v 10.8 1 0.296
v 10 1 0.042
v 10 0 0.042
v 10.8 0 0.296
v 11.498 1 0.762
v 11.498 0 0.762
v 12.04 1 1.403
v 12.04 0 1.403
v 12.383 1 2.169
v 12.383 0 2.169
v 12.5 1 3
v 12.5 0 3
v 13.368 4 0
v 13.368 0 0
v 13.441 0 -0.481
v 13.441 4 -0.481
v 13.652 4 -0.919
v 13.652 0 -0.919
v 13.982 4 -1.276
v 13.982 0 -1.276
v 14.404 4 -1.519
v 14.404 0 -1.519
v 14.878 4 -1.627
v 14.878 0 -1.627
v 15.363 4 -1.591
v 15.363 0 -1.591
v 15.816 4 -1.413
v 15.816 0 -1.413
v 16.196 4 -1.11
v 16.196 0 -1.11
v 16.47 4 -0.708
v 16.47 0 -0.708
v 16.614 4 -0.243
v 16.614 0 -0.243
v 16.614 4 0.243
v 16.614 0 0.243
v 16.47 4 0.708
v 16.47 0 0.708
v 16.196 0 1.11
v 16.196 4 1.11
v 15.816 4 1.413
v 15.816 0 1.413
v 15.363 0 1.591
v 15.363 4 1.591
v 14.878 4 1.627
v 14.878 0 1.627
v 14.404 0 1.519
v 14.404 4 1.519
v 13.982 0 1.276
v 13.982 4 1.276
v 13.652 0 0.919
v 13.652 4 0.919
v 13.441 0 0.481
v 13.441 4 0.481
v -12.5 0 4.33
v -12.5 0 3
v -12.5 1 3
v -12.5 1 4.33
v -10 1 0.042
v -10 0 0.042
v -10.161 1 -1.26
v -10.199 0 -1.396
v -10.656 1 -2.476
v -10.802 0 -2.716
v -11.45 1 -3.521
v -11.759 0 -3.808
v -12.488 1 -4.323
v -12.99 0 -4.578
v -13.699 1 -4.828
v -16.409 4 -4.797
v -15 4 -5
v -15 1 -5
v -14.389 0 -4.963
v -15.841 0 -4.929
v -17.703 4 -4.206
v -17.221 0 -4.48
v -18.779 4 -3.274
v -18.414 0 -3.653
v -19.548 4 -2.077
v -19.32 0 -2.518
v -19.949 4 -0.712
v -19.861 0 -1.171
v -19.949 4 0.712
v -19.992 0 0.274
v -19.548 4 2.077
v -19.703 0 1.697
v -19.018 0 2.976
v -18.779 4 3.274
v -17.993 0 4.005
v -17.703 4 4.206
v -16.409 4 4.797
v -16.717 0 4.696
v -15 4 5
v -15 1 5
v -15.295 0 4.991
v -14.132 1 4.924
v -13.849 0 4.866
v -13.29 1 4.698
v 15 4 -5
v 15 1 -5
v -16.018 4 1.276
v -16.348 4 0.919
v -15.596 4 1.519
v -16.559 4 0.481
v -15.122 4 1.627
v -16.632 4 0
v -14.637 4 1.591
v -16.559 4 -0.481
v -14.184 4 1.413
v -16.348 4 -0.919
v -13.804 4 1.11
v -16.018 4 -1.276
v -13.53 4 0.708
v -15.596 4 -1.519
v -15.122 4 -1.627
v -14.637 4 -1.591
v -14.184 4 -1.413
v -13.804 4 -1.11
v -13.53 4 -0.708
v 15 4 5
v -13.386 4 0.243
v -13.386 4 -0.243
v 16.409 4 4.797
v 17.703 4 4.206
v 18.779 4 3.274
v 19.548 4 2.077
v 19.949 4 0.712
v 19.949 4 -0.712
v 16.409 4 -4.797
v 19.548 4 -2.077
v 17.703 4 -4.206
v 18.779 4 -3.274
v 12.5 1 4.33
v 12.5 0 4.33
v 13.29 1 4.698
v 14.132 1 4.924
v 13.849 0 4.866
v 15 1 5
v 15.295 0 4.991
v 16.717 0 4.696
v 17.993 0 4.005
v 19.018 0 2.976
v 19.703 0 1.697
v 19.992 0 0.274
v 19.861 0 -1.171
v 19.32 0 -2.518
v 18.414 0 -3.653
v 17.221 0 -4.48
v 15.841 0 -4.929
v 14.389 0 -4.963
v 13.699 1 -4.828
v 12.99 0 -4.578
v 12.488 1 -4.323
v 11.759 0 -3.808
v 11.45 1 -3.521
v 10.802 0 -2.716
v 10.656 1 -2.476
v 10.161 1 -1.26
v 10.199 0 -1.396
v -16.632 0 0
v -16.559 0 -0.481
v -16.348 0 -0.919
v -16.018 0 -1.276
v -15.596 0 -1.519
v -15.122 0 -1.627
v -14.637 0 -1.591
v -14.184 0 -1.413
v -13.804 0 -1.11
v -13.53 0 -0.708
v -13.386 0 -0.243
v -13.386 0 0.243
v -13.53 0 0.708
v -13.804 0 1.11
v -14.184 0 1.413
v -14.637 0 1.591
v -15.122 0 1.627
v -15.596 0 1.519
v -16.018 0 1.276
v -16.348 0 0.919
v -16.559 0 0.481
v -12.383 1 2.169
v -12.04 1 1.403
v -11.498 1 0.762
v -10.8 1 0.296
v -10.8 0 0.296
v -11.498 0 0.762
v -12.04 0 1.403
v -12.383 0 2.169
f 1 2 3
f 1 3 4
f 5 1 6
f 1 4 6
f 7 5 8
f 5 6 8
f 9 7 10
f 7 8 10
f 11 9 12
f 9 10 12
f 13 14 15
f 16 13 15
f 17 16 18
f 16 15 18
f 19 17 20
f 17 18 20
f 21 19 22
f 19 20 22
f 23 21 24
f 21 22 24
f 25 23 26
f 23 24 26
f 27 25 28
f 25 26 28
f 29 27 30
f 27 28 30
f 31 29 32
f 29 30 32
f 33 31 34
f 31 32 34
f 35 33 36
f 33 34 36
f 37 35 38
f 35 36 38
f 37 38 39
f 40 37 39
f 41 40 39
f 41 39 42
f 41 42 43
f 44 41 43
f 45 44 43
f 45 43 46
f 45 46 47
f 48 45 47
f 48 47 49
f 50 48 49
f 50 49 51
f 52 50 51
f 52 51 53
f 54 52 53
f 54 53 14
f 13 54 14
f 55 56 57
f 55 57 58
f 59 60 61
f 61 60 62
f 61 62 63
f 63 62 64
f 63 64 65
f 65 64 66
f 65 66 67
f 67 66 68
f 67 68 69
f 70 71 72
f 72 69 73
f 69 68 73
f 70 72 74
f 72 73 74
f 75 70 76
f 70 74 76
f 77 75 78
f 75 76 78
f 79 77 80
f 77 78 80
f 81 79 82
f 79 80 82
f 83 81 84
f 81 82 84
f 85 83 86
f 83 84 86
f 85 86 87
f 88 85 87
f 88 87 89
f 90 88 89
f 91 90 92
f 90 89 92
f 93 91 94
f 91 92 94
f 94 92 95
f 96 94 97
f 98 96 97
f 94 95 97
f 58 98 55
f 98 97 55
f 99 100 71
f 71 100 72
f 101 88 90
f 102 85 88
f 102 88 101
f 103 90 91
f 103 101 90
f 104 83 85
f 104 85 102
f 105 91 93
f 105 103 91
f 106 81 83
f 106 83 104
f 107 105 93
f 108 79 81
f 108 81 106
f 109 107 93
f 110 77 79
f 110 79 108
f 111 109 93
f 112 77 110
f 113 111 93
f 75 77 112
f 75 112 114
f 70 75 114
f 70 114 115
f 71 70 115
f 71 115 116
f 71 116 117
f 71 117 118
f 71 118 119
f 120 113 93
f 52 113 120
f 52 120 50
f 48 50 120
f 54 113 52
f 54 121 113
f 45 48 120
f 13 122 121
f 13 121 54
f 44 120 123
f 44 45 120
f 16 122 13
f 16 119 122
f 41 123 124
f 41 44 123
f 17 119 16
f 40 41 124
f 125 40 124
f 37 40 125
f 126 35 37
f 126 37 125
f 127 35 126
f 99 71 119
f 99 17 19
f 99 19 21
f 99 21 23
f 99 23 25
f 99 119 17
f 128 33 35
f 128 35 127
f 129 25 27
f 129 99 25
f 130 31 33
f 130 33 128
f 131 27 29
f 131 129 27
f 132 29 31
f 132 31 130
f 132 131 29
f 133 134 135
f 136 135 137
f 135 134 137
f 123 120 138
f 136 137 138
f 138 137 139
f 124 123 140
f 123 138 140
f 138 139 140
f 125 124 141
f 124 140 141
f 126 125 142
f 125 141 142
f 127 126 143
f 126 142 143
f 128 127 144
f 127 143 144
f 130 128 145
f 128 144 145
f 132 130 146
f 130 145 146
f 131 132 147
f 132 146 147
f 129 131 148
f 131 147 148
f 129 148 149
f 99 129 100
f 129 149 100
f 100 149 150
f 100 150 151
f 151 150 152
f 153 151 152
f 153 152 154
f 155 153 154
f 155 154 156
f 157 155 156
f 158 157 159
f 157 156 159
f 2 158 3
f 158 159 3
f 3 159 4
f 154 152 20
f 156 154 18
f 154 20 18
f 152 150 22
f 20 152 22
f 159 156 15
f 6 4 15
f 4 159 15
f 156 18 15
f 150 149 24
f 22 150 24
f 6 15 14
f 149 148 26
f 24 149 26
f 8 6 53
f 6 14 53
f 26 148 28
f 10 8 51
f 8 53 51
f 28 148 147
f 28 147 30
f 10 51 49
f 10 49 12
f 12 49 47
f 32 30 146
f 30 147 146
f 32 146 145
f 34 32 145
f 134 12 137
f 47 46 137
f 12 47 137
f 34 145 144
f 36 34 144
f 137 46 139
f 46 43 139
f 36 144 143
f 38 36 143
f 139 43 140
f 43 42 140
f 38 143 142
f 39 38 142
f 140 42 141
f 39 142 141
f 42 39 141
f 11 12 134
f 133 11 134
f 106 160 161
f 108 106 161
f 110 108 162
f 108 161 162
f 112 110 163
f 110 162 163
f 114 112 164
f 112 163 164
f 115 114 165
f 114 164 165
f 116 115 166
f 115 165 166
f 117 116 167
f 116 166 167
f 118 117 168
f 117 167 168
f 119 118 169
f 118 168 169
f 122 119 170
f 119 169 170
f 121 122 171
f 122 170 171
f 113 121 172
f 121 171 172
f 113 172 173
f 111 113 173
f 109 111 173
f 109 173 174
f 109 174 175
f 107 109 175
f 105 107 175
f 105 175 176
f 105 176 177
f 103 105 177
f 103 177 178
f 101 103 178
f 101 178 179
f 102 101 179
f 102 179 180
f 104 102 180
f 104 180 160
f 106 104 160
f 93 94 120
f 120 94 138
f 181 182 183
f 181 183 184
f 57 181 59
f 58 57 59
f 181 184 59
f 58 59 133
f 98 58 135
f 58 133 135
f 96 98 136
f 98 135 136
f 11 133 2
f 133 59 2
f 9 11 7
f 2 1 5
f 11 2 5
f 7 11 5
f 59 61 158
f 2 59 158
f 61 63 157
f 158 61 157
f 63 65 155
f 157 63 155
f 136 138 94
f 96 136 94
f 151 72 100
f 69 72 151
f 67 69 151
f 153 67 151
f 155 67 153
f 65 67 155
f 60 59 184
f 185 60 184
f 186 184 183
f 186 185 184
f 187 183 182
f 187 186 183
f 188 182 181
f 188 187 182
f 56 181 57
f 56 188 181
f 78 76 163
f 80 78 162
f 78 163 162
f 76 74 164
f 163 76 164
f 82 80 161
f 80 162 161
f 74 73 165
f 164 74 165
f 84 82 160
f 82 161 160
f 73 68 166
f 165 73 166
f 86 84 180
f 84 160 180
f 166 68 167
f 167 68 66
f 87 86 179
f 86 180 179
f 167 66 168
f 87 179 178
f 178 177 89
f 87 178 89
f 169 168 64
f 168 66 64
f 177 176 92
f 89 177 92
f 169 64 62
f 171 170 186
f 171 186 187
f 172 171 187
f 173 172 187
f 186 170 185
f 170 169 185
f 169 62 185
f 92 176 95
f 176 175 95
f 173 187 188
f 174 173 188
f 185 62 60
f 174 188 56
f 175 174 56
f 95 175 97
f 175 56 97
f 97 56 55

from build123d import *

# Parameters (mm, degrees)
SKETCH1_R             = 5
BOSS_EXTRUDE1_DEPTH   = 1
BOSS_EXTRUDE1_2_DEPTH = 1
BOSS_EXTRUDE2_DEPTH   = 3
F_4_CLEARANCE_HOLE1_D = 3.2639
CUT_EXTRUDE1_DEPTH    = 1


with BuildPart() as part:
    # Sketch1 → Boss-Extrude1 (new body)
    with BuildSketch(Plane(origin=(0, 0, 0), x_dir=(1, 0, 0), z_dir=(0, 1, 0))):
        with Locations(Location((-15, 0, 0), (0, 0, 270))):
            Circle(SKETCH1_R)
    extrude(amount=BOSS_EXTRUDE1_DEPTH)



with BuildPart() as body_2:
    # Sketch1 → Boss-Extrude1 2 (new body)
    with BuildSketch(Plane(origin=(0, 0, 0), x_dir=(1, 0, 0), z_dir=(0, 1, 0))):
        with Locations(Location((15, 0, 0), (0, 0, 270))):
            Circle(SKETCH1_R)
    extrude(amount=BOSS_EXTRUDE1_2_DEPTH)


with BuildPart() as part_1:
    add(part.part)

    add(body_2.part)  # Boss-Extrude2 merges body 2
    # Sketch2 → Boss-Extrude2 (add)
    with BuildSketch(Plane(origin=(0, 1, 0), x_dir=(1, 0, 0), z_dir=(0, 1, 0))):
        with BuildLine():
            Line((-15, -5), (15, -5))
            ThreePointArc((15, -5), (20, 0), (15, 5))
            Line((15, 5), (-15, 5))
            ThreePointArc((-15, 5), (-20, 0), (-15, -5))
        make_face()
    extrude(amount=BOSS_EXTRUDE2_DEPTH)

    # #4 Clearance Hole1 (through all)
    with Locations(Plane(origin=(0, 4, 0), x_dir=(1, 0, 0), z_dir=(0, 1, 0))):
        with Locations((-15, 0), (15, 0)):
            Hole(F_4_CLEARANCE_HOLE1_D / 2)

    # Sketch5 → Cut-Extrude1 (cut)
    with BuildSketch(Plane.XZ):
        with BuildLine():
            Line((12.5, 3), (12.5, 6))
            Line((12.5, 6), (9.5, 6))
            ThreePointArc((9.5, 6), (7.378679656, 5.121320344), (6.5, 3))
            Line((6.5, 3), (6.5, 0))
            Line((6.5, 0), (9.5, 0))
            ThreePointArc((9.5, 0), (11.621320344, 0.878679656), (12.5, 3))
        make_face()
        with BuildLine():
            Line((-12.5, 3), (-12.5, 6))
            Line((-12.5, 6), (-9.5, 6))
            ThreePointArc((-9.5, 6), (-7.378679656, 5.121320344), (-6.5, 3))
            Line((-6.5, 3), (-6.5, 0))
            Line((-6.5, 0), (-9.5, 0))
            ThreePointArc((-9.5, 0), (-11.621320344, 0.878679656), (-12.5, 3))
        make_face()
    extrude(amount=-CUT_EXTRUDE1_DEPTH, mode=Mode.SUBTRACT)


solid = part_1.part
